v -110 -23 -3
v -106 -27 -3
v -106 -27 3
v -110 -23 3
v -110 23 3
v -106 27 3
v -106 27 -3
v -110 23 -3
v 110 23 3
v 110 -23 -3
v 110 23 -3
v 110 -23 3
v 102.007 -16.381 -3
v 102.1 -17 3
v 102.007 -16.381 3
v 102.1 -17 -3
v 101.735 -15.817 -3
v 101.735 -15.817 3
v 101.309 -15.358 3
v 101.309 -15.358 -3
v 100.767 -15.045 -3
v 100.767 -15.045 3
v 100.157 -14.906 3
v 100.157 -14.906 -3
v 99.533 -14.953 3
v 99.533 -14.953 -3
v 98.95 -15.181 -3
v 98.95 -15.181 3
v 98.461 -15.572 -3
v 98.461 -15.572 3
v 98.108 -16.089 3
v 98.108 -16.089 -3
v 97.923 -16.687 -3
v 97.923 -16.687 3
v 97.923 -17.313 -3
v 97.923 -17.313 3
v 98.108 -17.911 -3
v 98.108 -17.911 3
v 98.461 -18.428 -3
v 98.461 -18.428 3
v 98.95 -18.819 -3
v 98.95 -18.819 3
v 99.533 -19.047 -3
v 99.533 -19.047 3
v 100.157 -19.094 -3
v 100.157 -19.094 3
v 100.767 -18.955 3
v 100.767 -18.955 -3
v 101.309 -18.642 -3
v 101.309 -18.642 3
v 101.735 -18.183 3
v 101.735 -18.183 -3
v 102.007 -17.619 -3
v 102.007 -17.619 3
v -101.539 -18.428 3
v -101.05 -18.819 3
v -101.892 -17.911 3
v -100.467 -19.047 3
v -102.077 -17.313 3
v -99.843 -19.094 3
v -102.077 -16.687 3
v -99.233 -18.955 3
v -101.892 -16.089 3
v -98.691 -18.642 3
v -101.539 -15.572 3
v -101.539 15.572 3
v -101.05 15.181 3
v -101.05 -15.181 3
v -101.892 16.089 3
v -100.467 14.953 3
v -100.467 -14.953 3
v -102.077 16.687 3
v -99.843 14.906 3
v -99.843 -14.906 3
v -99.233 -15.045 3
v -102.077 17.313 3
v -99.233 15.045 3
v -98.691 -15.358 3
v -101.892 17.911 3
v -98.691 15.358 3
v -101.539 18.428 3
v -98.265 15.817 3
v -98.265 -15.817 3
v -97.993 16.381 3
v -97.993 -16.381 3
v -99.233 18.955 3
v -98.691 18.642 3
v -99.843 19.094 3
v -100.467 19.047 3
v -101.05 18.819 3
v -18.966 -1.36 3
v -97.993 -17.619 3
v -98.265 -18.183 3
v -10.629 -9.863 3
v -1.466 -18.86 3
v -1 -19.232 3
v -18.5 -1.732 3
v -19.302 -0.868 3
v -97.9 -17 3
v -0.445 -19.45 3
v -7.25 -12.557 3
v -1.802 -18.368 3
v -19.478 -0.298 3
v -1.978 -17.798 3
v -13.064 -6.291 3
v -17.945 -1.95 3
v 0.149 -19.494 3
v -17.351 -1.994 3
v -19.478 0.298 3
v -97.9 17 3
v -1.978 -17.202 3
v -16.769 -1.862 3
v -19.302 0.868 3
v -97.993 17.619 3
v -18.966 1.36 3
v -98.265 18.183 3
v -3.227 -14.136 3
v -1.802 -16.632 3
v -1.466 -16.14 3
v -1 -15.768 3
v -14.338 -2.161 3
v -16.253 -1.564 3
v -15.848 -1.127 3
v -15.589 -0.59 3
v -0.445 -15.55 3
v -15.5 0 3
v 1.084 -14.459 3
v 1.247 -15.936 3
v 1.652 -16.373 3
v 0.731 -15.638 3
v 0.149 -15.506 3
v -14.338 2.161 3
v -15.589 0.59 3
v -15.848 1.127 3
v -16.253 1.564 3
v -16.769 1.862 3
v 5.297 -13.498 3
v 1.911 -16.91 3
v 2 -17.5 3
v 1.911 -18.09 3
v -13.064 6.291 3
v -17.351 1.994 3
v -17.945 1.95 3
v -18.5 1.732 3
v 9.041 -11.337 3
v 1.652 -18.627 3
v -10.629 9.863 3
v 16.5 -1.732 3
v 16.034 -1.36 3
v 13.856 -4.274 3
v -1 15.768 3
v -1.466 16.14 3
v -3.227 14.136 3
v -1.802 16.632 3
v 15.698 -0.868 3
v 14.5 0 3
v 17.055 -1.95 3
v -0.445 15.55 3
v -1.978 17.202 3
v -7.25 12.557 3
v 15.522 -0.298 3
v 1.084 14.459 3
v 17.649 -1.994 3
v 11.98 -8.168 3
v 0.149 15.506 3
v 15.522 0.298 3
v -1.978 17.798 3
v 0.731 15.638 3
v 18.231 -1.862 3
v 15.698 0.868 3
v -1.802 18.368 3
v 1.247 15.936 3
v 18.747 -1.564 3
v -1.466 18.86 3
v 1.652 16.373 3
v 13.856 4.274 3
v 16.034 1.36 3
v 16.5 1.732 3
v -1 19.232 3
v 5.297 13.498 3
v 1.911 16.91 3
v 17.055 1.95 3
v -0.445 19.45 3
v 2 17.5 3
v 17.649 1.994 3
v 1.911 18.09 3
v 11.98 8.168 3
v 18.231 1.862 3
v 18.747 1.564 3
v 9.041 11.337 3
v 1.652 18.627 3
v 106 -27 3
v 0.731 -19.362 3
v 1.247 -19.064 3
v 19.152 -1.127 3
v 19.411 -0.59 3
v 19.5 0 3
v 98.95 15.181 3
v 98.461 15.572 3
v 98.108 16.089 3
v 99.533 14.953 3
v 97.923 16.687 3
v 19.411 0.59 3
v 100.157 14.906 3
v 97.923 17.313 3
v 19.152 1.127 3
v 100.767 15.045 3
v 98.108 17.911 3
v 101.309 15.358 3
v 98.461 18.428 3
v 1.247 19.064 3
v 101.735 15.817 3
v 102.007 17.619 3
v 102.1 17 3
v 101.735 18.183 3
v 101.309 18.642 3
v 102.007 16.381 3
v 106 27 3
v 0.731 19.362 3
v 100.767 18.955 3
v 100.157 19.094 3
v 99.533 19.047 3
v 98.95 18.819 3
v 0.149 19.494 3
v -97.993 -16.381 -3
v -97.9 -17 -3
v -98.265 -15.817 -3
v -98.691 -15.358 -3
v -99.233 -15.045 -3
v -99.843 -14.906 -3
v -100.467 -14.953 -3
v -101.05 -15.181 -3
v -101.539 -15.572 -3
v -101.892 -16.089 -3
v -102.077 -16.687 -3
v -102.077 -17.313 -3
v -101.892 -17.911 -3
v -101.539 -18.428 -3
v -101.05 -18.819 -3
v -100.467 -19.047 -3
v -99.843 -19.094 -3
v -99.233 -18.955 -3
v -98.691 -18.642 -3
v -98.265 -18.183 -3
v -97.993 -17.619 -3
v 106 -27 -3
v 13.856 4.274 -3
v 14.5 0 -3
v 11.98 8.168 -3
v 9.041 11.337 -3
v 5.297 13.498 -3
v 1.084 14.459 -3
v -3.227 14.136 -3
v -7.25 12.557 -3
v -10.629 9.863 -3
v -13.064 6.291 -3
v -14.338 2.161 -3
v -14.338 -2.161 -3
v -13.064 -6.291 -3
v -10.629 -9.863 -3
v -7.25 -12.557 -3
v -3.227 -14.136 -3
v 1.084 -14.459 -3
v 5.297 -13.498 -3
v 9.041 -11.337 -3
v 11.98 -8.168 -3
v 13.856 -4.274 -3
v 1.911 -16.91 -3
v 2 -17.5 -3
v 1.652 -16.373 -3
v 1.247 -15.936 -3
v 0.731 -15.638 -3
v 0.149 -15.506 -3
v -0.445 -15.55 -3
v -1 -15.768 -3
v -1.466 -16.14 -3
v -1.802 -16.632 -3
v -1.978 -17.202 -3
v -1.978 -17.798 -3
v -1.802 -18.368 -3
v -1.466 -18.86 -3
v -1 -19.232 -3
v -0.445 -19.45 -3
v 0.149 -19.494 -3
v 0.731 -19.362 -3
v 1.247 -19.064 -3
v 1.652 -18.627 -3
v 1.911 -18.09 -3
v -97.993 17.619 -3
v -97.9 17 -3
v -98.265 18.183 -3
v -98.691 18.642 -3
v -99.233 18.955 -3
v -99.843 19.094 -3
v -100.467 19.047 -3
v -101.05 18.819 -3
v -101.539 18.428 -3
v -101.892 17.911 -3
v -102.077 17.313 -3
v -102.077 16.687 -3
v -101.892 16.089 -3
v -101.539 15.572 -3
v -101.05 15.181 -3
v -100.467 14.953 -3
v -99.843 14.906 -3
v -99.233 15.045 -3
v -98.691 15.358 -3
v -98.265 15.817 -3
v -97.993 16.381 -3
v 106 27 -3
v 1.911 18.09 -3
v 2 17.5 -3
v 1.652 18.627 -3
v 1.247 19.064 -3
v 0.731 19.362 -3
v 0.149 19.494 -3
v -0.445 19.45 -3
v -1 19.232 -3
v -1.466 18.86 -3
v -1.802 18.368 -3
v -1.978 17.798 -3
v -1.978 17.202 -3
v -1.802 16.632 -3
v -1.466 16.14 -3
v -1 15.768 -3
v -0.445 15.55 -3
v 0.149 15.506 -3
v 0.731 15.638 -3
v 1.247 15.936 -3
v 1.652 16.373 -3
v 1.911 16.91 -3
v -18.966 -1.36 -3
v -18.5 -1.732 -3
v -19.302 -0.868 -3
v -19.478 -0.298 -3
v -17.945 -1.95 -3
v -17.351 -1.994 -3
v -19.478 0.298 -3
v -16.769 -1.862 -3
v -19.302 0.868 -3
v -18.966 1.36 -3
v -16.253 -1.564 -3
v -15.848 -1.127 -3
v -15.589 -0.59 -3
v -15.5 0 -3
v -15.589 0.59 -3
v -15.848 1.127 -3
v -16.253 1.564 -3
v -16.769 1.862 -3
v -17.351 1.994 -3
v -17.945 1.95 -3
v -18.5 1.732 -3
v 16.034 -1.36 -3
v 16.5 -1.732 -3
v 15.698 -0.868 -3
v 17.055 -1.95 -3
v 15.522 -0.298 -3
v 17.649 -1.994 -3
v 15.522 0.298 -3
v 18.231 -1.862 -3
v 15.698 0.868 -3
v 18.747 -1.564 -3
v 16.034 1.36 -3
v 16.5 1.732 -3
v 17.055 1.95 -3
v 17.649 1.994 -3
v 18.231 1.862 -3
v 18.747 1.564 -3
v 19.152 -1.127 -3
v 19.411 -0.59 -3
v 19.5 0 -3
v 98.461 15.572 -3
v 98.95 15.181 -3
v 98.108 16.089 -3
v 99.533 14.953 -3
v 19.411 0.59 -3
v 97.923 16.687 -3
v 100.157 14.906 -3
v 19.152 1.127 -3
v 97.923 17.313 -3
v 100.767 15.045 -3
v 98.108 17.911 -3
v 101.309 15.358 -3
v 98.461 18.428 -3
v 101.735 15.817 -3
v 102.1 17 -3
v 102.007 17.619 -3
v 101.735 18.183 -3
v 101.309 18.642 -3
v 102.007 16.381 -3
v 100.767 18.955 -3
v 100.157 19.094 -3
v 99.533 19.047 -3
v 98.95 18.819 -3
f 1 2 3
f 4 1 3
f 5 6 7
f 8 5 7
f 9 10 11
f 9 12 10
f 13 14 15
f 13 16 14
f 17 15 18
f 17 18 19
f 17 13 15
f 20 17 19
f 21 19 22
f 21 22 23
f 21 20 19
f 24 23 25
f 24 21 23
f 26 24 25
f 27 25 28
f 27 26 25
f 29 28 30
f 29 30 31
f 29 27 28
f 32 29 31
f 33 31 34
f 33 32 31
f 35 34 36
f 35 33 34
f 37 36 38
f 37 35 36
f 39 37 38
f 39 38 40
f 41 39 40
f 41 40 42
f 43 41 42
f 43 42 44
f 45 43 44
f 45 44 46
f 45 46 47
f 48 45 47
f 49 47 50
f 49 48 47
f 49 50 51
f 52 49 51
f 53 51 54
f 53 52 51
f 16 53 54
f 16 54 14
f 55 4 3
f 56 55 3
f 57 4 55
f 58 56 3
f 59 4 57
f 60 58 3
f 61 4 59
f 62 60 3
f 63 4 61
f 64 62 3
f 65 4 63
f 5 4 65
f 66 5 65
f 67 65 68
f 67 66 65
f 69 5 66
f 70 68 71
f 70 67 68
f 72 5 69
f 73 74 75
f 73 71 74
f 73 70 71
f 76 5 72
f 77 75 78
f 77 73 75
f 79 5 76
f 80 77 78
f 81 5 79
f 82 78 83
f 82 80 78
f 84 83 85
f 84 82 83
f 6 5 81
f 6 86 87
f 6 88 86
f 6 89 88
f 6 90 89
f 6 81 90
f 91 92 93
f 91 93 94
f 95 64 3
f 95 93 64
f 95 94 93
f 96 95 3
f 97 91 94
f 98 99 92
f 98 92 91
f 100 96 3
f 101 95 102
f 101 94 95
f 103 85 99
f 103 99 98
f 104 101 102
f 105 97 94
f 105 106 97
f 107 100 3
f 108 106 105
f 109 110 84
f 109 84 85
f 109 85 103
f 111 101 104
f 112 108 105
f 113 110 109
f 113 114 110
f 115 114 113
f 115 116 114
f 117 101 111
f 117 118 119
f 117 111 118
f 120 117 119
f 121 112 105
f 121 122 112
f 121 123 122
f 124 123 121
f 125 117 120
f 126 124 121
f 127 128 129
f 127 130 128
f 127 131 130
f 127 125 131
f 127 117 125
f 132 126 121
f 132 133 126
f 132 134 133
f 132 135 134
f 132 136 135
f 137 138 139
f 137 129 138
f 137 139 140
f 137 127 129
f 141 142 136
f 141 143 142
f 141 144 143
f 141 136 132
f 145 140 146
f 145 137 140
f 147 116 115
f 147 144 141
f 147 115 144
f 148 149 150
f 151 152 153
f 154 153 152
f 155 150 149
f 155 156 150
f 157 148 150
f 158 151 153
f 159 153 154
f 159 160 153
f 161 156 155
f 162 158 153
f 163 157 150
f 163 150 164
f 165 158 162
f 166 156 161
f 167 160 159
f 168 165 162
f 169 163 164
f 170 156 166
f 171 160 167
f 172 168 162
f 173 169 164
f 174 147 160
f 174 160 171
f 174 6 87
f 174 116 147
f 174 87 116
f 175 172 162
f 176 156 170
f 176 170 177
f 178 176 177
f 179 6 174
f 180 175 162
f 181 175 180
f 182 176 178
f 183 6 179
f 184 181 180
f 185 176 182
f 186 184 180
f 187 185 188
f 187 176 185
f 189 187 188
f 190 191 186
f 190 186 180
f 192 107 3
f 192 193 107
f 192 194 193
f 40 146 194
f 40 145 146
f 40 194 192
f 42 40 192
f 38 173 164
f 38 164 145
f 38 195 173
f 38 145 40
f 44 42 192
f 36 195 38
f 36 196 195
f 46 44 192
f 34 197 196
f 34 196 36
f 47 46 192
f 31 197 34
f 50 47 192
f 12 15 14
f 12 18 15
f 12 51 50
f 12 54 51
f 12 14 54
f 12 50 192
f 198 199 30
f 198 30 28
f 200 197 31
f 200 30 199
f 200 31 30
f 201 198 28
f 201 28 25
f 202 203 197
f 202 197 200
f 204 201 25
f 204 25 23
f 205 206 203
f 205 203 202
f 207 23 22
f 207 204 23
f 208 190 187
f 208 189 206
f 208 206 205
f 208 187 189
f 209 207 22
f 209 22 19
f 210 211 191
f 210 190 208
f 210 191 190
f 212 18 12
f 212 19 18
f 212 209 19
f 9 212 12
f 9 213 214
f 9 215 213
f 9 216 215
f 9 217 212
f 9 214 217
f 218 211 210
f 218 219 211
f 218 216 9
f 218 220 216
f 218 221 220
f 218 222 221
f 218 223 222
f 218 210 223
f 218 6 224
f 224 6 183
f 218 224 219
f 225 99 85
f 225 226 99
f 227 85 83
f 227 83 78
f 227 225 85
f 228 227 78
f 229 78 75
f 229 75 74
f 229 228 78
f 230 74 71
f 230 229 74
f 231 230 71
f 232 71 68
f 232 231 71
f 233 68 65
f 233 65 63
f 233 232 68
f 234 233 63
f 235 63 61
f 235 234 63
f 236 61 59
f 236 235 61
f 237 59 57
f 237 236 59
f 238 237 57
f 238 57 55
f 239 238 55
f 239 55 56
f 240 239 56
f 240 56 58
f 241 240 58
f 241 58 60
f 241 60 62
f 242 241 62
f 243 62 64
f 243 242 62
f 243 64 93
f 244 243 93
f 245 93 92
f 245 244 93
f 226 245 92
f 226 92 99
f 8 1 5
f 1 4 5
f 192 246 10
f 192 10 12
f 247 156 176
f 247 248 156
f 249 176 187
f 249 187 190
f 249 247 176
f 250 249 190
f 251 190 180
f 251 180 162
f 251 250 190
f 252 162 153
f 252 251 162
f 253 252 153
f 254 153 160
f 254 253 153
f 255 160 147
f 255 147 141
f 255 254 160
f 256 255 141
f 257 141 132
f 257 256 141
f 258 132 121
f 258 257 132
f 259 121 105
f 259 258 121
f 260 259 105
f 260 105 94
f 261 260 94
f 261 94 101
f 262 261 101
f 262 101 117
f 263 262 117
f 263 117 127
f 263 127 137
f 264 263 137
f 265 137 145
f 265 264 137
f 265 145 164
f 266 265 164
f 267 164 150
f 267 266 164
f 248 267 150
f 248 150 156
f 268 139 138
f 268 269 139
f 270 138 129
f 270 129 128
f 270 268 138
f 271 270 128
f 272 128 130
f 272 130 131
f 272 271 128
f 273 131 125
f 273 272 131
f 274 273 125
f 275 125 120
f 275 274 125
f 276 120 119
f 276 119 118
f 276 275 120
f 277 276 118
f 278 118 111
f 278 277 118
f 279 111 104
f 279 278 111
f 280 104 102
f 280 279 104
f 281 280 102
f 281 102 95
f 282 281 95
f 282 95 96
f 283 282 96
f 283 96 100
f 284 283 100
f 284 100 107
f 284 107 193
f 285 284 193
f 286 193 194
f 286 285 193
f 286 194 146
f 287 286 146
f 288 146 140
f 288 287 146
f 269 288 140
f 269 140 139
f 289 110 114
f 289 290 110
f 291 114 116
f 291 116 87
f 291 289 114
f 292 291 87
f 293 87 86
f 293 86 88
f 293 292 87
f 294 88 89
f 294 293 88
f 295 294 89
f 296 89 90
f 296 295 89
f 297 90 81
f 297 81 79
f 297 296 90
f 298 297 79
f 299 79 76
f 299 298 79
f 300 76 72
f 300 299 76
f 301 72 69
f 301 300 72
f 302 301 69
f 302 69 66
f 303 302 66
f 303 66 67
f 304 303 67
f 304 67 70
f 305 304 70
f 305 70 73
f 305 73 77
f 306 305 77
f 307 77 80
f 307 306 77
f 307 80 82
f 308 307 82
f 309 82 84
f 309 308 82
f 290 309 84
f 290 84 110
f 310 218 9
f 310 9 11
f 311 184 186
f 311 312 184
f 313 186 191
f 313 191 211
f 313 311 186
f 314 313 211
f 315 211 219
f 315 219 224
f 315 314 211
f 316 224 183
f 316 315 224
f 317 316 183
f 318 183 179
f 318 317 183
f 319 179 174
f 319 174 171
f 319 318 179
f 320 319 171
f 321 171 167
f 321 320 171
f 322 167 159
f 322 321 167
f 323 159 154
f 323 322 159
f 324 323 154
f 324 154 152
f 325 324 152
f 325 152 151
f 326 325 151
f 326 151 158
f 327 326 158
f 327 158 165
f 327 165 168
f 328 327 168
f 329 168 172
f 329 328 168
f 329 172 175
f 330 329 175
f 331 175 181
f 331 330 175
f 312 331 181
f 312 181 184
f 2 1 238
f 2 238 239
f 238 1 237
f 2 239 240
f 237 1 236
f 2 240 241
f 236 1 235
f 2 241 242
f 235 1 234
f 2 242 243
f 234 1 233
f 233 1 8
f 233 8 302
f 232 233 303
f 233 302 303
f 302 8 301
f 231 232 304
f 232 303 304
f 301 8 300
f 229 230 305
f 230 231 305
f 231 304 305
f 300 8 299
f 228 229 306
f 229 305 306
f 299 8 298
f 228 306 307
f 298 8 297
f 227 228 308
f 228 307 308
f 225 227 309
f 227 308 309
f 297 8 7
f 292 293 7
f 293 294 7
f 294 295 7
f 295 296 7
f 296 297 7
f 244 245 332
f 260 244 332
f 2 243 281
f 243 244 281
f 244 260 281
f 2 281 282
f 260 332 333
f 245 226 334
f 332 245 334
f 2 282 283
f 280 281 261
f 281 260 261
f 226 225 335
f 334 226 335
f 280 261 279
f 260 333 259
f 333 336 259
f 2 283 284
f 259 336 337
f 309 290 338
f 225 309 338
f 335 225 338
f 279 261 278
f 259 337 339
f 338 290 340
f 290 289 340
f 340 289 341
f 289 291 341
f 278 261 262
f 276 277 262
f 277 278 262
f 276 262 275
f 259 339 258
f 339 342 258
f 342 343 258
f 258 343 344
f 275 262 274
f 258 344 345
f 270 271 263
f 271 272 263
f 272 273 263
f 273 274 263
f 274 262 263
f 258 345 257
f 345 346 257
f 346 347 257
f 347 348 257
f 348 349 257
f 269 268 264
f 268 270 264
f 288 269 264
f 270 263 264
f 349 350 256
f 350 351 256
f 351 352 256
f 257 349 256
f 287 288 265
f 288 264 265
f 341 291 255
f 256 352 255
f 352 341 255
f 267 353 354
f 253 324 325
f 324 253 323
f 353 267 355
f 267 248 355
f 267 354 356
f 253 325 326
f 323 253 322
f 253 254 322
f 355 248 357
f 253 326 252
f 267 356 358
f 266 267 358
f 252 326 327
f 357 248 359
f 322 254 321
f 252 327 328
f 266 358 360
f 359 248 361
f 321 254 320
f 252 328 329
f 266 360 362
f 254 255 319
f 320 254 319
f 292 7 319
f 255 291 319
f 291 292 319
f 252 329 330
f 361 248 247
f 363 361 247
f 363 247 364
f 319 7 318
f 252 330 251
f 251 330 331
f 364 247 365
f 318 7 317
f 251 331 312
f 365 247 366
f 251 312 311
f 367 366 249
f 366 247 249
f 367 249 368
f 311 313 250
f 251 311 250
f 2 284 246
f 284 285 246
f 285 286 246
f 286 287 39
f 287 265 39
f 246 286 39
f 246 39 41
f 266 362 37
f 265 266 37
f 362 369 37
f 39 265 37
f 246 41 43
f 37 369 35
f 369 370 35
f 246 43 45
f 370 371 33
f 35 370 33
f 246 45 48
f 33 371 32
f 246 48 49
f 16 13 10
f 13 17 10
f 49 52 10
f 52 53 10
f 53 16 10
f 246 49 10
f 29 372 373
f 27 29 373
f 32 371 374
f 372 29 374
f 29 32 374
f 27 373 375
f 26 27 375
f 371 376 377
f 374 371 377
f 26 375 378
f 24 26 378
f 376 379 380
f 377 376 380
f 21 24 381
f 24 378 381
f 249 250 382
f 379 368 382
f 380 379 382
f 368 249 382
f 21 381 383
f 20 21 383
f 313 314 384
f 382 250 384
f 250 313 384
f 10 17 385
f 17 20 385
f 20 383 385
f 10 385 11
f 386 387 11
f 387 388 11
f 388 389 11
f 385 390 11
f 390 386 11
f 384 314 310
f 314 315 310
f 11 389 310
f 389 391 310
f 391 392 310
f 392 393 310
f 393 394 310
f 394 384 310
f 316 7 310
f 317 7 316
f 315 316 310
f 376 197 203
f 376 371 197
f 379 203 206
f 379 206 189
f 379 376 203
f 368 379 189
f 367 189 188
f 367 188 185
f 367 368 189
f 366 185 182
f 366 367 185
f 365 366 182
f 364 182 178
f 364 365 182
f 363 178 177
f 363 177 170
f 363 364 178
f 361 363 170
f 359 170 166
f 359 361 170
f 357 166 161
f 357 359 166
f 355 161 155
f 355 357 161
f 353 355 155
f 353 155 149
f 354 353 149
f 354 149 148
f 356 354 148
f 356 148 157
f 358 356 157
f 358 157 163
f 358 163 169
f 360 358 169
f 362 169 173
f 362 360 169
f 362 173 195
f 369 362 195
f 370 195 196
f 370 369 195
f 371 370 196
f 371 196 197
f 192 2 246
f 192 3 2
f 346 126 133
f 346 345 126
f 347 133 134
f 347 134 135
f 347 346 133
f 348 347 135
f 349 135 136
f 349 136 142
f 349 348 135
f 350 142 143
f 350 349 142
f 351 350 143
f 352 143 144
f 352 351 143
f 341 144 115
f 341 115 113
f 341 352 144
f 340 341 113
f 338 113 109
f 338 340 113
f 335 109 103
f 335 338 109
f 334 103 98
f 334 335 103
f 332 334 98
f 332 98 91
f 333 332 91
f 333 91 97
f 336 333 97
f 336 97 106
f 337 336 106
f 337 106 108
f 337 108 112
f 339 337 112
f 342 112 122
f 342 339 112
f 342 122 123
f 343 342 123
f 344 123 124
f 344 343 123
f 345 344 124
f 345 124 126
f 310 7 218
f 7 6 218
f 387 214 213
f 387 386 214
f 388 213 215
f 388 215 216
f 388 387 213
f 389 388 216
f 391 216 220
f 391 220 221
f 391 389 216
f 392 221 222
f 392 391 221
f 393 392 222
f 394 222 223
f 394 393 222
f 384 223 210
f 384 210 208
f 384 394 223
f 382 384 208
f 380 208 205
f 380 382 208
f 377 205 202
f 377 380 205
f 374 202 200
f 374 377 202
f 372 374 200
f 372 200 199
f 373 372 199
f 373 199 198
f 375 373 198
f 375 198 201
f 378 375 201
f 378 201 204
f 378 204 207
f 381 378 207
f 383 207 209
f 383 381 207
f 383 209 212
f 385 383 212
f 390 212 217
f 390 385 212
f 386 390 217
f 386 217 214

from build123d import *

# Parameters (mm, degrees)
SKETCH_1_W      = 220
SKETCH_1_H      = 54
SKETCH_1_R      = 2.1
SKETCH_1_R_2    = 2
SKETCH_1_R_3    = 14.5
EXTRUDE_1_DEPTH = 3
CHAMFER_1_SIZE  = 4


with BuildPart() as part:
    # 草图1 → 凸台-拉伸1 (new, symmetric)
    with BuildSketch(Plane.XY):
        Rectangle(SKETCH_1_W, SKETCH_1_H)
        with Locations((-100, 17)):
            Circle(SKETCH_1_R, mode=Mode.SUBTRACT)
        with Locations((-100, -17)):
            Circle(SKETCH_1_R, mode=Mode.SUBTRACT)
        with Locations((100, 17)):
            Circle(SKETCH_1_R, mode=Mode.SUBTRACT)
        with Locations((100, -17)):
            Circle(SKETCH_1_R, mode=Mode.SUBTRACT)
        with Locations((0, 17.5)):
            Circle(SKETCH_1_R_2, mode=Mode.SUBTRACT)
        Circle(SKETCH_1_R_3, mode=Mode.SUBTRACT)
        with Locations((17.5, 0)):
            Circle(SKETCH_1_R_2, mode=Mode.SUBTRACT)
        with Locations((0, -17.5)):
            Circle(SKETCH_1_R_2, mode=Mode.SUBTRACT)
        with Locations((-17.5, 0)):
            Circle(SKETCH_1_R_2, mode=Mode.SUBTRACT)
    extrude(amount=EXTRUDE_1_DEPTH, both=True)

    # 倒角1
    chamfer_1_edges = [part.edges().sort_by_distance(p)[0] for p in [
        (-110, 27, 0),
        (110, 27, 0),
        (110, -27, 0),
        (-110, -27, 0),
    ]]
    chamfer(chamfer_1_edges, length=CHAMFER_1_SIZE)


solid = part.part
